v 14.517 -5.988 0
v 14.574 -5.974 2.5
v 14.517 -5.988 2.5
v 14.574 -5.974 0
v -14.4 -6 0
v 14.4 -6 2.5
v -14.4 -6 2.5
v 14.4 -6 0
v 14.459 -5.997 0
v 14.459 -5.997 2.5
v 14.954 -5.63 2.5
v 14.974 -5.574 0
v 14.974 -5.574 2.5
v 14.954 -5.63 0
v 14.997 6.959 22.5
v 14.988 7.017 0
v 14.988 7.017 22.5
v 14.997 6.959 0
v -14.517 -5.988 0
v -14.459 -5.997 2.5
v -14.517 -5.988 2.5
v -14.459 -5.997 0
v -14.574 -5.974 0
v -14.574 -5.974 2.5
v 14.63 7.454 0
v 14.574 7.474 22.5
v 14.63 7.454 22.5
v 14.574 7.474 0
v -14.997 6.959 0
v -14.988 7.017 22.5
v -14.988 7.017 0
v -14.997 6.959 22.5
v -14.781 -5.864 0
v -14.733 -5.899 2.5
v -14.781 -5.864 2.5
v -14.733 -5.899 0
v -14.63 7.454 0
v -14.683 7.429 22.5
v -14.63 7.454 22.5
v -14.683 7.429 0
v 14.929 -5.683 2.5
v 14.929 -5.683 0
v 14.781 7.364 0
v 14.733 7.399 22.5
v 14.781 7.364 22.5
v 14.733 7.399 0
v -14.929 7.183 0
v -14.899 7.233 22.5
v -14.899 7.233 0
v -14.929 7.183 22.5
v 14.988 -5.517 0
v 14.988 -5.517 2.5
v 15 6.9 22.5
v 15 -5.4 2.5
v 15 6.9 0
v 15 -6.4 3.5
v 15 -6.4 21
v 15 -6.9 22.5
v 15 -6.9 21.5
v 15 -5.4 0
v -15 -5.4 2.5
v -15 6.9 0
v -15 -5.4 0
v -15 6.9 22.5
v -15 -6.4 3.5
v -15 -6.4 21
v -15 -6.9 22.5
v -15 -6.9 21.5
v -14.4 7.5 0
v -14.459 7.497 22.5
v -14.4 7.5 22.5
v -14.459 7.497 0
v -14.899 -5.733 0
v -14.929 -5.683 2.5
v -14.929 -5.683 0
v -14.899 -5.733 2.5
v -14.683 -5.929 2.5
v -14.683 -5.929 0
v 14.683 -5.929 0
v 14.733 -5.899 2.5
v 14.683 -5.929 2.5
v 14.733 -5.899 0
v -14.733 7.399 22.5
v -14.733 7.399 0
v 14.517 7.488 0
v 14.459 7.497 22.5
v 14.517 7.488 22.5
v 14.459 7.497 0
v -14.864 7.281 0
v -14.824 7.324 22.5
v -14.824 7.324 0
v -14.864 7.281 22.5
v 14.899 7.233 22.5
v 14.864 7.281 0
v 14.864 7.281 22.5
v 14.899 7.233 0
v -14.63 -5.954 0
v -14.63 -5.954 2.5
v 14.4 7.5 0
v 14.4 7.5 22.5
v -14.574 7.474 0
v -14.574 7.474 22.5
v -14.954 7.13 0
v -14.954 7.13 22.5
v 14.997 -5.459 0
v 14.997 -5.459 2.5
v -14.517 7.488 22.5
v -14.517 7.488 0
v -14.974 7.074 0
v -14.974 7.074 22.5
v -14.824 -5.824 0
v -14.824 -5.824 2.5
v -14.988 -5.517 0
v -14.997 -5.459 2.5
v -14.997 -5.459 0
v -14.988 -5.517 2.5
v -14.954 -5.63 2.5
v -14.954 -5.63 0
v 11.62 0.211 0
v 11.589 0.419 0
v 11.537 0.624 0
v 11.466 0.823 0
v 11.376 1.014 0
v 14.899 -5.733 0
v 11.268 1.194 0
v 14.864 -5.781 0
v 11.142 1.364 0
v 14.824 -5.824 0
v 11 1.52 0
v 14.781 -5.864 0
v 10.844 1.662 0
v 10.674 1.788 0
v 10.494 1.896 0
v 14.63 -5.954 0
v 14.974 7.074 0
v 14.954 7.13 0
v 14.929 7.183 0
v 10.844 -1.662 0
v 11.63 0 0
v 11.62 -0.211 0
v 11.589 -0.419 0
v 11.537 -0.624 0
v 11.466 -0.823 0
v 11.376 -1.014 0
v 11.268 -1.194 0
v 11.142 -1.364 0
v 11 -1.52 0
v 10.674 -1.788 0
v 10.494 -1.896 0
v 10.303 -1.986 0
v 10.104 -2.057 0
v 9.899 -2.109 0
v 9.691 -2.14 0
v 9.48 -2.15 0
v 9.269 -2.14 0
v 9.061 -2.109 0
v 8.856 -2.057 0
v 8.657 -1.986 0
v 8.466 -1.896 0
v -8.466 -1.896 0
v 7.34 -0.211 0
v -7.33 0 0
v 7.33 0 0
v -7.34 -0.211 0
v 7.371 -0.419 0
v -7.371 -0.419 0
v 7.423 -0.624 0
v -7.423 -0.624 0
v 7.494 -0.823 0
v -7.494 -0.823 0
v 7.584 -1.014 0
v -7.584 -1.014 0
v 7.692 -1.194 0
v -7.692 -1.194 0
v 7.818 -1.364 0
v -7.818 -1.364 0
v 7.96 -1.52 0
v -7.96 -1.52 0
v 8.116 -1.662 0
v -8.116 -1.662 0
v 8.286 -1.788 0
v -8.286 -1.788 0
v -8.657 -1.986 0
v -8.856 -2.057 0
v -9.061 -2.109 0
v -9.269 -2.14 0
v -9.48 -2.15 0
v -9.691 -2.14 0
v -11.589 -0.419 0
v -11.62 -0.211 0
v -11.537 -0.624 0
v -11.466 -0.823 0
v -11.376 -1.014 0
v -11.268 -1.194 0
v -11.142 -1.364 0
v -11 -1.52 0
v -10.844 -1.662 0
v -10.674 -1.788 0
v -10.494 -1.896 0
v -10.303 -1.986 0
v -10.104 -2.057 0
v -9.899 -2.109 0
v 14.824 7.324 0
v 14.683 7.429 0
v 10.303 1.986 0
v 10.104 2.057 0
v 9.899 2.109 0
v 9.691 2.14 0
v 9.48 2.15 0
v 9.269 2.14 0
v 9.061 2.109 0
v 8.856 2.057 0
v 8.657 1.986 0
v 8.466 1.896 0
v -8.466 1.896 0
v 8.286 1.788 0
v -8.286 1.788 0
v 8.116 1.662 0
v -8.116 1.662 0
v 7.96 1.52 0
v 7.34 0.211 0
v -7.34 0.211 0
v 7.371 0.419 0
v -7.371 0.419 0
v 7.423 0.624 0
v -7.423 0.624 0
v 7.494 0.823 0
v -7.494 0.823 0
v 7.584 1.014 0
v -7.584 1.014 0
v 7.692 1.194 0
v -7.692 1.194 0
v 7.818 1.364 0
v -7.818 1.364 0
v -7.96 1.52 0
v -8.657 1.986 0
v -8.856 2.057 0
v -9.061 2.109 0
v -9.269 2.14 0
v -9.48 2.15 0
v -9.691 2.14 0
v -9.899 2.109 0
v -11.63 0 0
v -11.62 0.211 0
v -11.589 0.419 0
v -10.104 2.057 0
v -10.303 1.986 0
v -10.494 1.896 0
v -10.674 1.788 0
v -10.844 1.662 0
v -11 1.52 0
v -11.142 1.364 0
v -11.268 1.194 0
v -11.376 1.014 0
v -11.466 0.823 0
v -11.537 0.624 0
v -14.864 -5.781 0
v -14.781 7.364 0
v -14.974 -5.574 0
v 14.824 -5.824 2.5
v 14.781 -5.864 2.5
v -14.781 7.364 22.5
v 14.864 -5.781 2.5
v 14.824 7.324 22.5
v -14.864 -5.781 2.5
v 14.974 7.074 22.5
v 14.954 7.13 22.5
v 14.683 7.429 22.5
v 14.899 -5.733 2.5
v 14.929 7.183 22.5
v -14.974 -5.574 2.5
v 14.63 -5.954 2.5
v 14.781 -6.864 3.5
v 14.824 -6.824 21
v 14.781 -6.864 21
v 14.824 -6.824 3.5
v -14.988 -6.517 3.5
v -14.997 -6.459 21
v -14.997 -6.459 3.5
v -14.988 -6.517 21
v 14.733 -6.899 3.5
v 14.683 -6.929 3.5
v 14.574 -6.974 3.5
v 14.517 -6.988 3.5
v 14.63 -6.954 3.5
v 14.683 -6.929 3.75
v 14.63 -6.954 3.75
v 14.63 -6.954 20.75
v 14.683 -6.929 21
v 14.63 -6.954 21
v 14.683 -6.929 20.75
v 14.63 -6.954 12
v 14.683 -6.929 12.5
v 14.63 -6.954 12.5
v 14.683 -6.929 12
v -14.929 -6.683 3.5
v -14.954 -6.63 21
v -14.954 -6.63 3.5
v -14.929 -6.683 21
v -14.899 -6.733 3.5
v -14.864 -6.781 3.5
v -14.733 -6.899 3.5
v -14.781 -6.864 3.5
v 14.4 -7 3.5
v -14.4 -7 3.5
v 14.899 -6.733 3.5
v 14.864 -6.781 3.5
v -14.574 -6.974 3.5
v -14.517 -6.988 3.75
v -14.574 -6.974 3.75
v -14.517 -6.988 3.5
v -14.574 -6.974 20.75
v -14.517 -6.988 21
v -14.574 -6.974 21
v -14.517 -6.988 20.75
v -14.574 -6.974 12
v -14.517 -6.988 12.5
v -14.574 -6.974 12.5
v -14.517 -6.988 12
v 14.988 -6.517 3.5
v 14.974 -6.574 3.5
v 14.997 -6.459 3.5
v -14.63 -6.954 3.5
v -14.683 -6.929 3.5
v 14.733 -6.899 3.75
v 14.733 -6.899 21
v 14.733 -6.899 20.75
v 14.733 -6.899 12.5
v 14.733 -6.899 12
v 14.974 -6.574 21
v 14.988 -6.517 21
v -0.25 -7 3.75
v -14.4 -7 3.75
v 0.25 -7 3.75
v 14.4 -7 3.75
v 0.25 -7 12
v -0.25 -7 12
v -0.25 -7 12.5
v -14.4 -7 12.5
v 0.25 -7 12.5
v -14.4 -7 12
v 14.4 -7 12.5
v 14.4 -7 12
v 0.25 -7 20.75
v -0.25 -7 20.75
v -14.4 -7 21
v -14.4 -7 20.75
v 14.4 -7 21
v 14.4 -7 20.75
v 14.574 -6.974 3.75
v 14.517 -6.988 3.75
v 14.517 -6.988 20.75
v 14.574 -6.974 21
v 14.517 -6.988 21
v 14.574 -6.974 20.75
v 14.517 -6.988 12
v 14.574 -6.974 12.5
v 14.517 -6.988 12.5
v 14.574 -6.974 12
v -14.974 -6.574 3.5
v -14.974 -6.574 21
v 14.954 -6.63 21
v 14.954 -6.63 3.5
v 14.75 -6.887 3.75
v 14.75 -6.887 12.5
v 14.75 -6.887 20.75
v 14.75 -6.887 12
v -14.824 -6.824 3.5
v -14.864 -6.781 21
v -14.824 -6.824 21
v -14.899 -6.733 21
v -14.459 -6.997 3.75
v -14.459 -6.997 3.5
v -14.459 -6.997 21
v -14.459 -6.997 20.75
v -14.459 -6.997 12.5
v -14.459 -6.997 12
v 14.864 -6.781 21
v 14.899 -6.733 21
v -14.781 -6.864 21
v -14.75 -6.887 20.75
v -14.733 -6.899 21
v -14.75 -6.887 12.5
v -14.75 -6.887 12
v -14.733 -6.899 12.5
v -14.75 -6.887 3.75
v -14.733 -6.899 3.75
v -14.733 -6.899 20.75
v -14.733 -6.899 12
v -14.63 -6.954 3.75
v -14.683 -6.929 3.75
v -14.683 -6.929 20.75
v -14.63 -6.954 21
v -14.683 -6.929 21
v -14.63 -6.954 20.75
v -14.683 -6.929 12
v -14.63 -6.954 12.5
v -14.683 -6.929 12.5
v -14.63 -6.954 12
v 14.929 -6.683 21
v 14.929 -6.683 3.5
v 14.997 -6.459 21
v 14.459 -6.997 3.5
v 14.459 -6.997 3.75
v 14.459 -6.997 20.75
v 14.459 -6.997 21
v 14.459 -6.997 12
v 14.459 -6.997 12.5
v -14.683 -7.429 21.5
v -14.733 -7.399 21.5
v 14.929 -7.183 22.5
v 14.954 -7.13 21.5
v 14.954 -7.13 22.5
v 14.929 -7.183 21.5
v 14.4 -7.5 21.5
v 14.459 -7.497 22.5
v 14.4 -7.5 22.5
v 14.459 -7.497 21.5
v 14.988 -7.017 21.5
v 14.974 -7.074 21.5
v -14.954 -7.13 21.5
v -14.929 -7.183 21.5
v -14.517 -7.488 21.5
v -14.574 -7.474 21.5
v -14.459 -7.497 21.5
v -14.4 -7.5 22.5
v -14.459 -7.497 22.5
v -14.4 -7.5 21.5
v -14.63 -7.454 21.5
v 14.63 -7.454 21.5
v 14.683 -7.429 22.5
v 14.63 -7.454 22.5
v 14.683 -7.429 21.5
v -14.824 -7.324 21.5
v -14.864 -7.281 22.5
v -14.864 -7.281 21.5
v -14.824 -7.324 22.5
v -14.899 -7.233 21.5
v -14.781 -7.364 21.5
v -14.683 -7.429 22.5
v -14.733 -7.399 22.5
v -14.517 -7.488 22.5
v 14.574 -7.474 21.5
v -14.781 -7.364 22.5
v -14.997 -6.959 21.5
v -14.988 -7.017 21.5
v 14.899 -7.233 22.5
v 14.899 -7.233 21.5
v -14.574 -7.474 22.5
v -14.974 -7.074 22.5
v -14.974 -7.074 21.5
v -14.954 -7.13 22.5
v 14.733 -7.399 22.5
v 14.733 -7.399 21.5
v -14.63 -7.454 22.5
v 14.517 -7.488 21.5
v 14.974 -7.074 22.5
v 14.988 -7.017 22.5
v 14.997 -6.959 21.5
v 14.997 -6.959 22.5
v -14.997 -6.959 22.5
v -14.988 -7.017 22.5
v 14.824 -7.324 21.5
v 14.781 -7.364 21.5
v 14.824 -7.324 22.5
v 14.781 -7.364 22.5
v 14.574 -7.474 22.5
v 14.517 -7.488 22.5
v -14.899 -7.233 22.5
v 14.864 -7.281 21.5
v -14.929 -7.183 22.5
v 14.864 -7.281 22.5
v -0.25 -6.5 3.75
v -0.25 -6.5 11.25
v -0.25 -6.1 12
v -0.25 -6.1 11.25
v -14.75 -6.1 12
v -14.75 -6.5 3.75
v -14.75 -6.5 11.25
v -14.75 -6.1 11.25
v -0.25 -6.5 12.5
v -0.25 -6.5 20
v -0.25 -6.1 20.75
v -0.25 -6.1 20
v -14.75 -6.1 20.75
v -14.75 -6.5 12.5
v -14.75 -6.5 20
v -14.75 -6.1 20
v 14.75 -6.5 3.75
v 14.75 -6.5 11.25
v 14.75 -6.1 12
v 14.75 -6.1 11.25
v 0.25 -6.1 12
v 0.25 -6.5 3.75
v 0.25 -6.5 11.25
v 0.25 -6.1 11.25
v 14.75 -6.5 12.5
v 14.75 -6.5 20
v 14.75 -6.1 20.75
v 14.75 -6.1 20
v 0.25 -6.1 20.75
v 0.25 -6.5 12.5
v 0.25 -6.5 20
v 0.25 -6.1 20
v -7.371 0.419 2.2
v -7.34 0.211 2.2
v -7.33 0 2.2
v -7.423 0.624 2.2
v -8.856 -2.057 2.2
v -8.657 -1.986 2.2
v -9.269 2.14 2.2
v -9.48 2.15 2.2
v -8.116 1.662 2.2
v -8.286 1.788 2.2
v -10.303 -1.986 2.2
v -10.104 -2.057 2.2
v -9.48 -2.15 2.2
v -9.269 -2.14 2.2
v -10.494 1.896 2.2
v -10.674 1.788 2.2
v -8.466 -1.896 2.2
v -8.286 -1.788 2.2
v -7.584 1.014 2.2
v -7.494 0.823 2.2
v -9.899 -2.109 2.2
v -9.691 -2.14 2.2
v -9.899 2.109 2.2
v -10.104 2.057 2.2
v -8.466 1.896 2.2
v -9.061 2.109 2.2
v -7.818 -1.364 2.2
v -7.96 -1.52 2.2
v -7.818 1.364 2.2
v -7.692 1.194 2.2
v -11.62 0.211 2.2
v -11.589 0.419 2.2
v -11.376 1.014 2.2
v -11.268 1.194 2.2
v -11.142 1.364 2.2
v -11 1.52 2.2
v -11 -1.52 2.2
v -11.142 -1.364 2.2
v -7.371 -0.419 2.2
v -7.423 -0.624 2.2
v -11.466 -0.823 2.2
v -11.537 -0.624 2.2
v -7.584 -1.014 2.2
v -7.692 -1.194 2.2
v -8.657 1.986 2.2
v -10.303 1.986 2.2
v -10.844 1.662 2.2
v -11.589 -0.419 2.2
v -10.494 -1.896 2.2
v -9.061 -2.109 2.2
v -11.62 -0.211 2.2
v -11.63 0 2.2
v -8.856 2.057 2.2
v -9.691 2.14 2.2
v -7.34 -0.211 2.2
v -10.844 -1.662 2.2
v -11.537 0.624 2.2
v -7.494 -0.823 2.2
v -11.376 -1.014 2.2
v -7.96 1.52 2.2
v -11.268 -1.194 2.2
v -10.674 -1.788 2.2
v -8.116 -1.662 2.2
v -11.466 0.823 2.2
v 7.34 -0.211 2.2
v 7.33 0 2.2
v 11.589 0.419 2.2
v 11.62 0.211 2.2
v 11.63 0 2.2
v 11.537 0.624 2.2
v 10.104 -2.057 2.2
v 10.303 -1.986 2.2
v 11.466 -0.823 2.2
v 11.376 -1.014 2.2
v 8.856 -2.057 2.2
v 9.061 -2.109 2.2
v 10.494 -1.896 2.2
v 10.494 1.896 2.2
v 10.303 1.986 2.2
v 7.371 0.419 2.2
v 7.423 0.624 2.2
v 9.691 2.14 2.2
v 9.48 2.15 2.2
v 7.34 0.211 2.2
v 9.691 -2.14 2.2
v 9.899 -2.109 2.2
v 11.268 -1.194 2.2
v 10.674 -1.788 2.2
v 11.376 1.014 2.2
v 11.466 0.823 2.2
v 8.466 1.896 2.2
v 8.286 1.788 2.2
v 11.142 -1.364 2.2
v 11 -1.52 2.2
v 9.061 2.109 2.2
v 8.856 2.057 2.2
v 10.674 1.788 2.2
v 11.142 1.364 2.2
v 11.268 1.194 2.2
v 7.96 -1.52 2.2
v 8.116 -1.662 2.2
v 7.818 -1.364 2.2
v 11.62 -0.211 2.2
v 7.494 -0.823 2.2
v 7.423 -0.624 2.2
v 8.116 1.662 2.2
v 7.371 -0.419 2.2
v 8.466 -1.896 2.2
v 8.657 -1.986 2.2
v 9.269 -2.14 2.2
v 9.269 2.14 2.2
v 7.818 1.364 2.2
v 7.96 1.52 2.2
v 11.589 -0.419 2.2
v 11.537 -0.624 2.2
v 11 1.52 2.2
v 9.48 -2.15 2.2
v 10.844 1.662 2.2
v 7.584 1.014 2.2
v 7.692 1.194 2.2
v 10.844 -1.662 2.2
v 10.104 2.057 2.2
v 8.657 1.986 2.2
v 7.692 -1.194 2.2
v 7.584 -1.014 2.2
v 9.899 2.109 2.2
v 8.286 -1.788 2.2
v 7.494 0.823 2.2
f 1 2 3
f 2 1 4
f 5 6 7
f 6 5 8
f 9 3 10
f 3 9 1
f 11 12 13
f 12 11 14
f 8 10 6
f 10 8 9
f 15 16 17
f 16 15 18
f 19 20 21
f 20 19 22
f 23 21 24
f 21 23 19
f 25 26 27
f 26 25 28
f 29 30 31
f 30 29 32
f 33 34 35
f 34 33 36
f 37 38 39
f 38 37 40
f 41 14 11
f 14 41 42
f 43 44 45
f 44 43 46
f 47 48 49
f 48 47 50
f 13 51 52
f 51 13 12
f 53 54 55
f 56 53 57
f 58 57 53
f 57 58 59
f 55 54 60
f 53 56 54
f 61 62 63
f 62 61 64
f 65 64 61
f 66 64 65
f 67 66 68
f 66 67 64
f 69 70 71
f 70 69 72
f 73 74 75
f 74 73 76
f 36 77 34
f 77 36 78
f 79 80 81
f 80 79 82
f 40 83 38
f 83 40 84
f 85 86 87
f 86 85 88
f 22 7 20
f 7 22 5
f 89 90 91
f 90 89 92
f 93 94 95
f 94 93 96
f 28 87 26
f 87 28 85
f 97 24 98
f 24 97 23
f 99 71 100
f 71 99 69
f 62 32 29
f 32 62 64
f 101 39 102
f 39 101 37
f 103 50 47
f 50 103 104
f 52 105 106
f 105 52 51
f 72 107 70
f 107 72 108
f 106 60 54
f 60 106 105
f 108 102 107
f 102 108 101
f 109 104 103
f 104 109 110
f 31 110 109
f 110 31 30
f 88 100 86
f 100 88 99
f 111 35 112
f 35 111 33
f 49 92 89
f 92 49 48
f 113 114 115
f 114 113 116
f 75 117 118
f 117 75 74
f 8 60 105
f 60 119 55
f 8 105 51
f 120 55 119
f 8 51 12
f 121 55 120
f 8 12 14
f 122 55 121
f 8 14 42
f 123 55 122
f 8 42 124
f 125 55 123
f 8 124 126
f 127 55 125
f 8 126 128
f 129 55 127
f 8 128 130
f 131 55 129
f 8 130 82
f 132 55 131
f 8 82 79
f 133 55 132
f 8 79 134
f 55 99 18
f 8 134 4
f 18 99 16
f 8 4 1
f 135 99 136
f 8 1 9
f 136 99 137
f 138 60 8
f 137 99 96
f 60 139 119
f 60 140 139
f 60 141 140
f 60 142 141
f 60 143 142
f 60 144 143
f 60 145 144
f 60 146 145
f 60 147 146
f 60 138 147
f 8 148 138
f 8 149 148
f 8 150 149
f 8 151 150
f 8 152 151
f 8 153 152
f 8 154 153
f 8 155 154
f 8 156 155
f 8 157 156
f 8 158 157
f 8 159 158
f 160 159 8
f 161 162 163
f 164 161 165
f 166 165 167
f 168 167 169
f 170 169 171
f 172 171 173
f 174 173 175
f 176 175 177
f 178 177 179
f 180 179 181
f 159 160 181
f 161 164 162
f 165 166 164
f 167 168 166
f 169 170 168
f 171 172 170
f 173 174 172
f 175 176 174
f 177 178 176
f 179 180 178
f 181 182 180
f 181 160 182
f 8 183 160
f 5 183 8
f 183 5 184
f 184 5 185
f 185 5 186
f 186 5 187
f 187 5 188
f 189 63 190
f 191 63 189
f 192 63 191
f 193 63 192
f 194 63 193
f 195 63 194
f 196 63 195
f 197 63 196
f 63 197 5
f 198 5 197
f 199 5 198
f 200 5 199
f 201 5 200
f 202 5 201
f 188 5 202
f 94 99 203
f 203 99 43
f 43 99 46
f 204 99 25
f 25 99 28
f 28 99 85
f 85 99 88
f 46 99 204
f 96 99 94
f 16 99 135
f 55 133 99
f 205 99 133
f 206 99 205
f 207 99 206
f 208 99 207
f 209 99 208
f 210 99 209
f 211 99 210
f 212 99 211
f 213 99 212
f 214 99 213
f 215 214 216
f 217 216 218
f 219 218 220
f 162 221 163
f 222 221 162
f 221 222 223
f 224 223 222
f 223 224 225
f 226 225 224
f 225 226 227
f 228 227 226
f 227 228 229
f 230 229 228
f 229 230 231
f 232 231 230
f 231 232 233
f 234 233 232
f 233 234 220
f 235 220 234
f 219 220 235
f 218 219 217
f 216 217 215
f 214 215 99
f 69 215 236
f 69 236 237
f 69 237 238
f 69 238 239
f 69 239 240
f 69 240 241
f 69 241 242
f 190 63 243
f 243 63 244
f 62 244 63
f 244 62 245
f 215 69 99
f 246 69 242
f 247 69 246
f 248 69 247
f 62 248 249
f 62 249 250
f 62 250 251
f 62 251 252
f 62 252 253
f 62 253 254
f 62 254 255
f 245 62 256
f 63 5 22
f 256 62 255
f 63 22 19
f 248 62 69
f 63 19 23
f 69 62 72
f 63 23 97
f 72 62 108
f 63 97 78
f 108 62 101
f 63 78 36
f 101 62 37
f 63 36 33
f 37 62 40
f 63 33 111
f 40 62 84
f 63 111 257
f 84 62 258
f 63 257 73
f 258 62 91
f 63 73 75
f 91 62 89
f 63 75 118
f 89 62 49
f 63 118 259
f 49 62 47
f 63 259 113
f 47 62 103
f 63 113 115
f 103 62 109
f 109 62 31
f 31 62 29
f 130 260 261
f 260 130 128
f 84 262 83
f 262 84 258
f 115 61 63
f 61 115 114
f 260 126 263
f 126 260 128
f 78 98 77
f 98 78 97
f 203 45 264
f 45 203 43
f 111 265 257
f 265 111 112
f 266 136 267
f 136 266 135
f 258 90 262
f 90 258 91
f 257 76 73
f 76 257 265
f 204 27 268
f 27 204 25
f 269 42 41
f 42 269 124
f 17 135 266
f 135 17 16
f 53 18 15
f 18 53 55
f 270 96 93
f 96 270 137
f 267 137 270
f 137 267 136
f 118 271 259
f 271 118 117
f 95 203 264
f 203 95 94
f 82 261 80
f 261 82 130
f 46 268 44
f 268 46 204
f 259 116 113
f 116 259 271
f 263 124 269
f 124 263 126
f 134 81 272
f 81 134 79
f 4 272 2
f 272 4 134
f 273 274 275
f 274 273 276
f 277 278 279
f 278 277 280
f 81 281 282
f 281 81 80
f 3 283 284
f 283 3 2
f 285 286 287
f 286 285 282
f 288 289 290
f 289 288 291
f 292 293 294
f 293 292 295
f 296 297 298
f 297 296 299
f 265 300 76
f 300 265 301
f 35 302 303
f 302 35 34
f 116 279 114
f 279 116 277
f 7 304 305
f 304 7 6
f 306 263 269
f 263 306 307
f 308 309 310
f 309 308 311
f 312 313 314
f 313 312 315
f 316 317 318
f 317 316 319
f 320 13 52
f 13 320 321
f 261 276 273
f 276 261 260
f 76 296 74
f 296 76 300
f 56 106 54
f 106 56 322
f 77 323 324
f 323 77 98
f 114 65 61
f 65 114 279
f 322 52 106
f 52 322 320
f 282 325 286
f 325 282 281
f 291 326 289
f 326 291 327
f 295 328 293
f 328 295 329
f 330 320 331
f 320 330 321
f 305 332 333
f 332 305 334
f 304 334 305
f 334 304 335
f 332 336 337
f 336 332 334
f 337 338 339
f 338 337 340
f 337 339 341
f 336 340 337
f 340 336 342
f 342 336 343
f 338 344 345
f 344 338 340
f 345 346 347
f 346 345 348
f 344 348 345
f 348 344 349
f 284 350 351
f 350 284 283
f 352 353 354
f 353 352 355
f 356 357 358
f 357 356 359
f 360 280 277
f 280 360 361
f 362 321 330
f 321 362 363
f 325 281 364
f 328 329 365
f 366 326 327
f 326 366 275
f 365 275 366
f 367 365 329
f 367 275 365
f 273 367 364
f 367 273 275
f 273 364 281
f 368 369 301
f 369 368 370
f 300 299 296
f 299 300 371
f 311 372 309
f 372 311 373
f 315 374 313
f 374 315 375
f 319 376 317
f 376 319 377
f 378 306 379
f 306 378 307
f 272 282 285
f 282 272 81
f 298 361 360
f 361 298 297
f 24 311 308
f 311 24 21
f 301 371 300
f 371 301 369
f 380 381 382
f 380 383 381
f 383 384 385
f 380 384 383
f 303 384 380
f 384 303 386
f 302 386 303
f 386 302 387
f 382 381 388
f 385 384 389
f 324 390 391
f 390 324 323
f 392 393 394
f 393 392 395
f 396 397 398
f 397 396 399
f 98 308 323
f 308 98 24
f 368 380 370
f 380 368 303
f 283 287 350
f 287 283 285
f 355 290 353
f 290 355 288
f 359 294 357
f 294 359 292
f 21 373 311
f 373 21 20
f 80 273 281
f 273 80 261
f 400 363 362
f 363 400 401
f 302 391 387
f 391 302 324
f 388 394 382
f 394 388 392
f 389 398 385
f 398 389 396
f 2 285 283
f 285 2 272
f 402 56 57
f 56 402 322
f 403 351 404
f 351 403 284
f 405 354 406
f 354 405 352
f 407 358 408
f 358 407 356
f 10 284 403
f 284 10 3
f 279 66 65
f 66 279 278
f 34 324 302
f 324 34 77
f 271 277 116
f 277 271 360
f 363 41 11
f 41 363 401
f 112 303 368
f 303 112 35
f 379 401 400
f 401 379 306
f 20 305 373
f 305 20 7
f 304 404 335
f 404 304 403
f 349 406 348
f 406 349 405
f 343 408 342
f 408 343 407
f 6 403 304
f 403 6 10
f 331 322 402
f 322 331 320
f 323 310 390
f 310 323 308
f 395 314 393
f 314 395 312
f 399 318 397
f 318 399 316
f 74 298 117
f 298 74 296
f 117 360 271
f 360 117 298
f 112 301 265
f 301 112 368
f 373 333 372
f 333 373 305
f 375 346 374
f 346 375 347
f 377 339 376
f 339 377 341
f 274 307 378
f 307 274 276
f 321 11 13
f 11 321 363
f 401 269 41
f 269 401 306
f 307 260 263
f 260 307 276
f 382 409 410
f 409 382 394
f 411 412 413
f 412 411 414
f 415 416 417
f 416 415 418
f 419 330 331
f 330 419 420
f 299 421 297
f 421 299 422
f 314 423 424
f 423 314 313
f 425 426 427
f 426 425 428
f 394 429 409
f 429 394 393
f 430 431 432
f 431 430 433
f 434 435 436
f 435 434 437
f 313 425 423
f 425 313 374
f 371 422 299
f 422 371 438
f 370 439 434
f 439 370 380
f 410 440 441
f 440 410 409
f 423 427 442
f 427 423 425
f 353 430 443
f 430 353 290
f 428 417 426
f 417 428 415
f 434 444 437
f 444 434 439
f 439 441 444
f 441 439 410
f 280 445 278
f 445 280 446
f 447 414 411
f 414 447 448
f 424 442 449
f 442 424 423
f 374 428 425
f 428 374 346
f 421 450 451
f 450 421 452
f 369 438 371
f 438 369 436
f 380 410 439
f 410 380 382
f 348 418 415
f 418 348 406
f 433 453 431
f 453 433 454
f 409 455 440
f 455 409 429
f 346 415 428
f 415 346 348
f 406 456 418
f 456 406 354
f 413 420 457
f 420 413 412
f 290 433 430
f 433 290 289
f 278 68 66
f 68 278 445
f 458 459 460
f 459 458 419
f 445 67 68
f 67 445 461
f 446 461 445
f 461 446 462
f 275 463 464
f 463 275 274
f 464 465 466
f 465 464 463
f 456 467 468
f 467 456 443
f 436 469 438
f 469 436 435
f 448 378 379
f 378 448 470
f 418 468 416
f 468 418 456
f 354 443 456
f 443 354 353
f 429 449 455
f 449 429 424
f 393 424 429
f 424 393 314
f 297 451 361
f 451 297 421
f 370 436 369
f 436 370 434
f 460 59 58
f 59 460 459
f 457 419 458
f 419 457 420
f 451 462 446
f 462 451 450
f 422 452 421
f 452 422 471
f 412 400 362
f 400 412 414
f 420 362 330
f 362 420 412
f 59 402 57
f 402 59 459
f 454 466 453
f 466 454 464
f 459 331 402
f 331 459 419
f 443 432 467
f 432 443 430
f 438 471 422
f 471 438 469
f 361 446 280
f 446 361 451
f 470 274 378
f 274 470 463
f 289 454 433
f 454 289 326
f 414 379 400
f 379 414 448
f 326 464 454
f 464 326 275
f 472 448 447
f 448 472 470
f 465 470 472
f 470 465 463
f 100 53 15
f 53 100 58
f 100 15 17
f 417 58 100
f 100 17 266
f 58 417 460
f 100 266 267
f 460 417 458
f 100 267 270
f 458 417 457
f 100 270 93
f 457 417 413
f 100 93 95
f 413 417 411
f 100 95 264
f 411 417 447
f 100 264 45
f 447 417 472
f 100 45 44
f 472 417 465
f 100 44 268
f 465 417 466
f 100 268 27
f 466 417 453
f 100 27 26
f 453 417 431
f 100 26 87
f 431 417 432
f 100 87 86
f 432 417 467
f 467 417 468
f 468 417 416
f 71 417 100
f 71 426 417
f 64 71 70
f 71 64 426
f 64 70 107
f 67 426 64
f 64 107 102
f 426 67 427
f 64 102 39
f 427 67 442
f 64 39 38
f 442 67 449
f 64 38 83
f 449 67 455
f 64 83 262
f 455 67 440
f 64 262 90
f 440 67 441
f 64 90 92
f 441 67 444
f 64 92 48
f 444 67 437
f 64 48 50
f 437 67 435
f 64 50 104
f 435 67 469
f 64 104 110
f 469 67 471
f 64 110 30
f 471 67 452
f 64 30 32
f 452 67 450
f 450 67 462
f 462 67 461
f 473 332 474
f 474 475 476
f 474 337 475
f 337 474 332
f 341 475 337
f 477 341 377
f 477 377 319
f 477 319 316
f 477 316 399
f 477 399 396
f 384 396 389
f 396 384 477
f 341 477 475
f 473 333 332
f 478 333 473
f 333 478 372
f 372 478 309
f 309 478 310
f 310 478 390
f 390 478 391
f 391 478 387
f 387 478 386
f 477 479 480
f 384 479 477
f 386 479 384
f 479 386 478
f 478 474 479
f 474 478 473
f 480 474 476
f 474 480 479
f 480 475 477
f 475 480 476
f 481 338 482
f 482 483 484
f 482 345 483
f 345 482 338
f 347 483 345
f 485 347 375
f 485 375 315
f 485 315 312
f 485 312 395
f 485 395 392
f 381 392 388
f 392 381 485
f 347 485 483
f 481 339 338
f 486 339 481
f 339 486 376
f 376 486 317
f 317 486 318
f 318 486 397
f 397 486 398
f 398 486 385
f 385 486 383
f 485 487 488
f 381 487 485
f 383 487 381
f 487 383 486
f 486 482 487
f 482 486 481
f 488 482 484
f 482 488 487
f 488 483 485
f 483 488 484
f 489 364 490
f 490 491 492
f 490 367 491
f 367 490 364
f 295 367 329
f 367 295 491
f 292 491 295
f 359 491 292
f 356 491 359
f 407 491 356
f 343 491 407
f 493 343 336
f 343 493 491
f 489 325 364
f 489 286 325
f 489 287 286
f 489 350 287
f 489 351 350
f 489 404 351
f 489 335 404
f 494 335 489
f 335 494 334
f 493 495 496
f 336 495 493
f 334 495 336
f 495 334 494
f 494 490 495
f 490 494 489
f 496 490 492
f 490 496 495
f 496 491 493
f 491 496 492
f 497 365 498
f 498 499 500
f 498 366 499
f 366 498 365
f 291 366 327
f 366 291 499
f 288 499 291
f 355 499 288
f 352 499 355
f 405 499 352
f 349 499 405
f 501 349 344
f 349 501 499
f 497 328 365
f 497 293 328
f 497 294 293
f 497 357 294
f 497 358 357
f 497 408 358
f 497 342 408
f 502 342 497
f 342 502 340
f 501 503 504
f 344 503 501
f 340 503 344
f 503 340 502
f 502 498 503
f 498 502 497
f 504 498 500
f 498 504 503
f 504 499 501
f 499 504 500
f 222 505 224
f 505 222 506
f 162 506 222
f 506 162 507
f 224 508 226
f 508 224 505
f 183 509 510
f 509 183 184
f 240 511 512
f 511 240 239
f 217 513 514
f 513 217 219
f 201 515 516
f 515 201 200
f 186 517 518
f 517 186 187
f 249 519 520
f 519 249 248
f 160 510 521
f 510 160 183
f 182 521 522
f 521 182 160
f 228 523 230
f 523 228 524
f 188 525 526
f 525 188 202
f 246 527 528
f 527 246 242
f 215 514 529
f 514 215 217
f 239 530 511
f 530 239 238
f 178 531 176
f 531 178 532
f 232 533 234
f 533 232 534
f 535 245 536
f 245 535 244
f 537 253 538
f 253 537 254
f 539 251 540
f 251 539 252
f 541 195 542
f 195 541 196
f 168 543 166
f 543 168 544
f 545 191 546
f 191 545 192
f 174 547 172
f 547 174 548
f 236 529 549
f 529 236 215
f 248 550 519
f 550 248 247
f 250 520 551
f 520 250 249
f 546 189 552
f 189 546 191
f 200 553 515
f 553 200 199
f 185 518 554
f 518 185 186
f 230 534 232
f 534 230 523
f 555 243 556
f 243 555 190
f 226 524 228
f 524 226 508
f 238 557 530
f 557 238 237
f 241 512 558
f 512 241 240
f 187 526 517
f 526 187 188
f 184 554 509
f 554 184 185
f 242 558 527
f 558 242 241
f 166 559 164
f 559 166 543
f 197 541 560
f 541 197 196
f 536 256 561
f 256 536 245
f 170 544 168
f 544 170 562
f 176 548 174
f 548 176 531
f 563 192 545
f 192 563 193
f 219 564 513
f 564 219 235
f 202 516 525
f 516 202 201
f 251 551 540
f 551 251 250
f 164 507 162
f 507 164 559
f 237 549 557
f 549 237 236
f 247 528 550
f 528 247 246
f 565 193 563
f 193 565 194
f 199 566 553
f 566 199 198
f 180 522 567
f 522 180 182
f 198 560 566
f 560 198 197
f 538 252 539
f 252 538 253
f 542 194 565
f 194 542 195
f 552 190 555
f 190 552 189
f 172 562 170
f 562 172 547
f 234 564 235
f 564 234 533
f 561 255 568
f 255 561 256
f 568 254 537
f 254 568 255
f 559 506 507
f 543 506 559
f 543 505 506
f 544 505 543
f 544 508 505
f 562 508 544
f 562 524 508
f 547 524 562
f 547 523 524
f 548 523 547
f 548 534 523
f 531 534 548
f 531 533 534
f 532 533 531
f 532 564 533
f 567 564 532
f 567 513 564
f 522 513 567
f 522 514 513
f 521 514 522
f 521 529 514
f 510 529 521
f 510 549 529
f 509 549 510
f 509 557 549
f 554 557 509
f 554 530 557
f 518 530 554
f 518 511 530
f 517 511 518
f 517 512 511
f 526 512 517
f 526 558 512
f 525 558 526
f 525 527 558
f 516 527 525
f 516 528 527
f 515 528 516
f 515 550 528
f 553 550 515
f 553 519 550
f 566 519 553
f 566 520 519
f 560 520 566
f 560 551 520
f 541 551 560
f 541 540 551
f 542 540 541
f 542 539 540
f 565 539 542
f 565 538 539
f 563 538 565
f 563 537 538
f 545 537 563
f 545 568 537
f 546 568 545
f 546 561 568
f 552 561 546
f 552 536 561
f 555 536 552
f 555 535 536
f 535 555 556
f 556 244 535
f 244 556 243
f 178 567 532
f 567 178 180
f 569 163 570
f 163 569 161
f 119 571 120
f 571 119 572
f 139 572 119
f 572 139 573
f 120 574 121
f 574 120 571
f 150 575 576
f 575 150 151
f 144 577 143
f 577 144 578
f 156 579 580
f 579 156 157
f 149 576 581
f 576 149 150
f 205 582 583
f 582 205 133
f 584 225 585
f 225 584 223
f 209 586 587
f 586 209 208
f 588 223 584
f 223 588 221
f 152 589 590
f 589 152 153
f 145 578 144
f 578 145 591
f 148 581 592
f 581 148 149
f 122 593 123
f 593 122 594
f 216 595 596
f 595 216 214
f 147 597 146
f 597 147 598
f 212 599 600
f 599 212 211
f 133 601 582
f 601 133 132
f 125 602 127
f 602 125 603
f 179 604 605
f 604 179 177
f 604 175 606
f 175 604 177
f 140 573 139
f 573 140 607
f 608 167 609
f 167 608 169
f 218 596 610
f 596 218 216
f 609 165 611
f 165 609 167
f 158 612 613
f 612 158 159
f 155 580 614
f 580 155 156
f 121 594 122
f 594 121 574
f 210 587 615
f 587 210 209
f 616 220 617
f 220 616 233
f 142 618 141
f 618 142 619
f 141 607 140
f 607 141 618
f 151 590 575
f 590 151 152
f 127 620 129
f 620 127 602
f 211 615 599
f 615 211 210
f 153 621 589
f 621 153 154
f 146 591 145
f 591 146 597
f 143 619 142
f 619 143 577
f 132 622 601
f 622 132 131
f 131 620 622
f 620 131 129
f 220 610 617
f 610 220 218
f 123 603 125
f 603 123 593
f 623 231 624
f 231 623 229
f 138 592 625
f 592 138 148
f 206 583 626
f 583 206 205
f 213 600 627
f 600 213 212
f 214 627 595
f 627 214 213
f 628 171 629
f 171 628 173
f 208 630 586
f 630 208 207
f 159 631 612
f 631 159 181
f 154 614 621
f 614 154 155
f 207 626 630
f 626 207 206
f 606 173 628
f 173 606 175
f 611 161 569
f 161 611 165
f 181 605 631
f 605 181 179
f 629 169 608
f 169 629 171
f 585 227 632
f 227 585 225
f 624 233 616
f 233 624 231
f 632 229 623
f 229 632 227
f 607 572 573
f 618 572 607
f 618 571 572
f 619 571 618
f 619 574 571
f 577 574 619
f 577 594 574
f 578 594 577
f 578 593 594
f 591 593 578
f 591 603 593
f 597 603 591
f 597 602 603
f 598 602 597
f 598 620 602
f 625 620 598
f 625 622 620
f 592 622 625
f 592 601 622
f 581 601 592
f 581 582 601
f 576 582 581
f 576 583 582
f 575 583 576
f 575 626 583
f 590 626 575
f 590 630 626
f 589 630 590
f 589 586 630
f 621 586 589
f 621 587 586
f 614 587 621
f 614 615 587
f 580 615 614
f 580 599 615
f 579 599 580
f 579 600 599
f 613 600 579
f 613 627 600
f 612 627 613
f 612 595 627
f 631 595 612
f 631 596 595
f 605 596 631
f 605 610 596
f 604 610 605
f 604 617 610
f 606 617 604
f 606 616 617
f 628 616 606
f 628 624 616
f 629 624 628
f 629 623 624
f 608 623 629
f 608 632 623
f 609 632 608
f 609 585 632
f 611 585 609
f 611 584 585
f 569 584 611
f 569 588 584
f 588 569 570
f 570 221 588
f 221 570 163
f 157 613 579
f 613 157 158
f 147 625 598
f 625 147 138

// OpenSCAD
// kitchen / worktop — a base-cabinet worktop run: a worktop slab overhanging a
// carcass of drawer fronts, the carcass standing on a plinth set back at the floor.
// The body is base_unit() and the fronts unit_fronts(); see the fitted-units section
// of lib/common.scad for the section drawing and why the detail is on the front face.
//
// It used to be a plain slab with two hairlines engraved on its top, and that is the
// one thing a kitchen run cannot be: from above a worktop IS a plain slab — the doors
// are under the overhang — so a token that only carries top-face detail has nothing to
// show. What reads is the silhouette from the side: the lip line under the slab, the
// grid of fronts below it and the toe kick in shadow at the floor.
//
// Width/Depth are the real-world footprint in cm: Depth is the standard 60 cm
// base-cabinet run; Width is modular — override to the standard run lengths 60, 80,
// 100 or 120 (all stay 60 cm deep). Height is the real worktop height — the standard
// 90 cm counter — shrunk by the plan scale like the footprint (see printed_h() in
// lib/common.scad), so every counter-height piece comes out level.
//
// The run's FRONT is the -Y edge; +Y is the wall side and stays flush, so two segments
// butt against each other and against the wall.

include <../lib/common.scad>

Width  = 120;  // cm — modular run length: 60, 80, 100 or 120 (all take Depth=60)
Depth  = 60;   // cm — standard base-cabinet depth
Height = 90;   // cm — standard worktop height

// the printed height, mm: Height at the plan scale
Print_h = printed_h(Height);

// The worktop slab, in real cm — how much of the height is counter rather than
// carcass. Shared with every other unit in the run (Unit_top in lib/common.scad), so
// the lip line carries across a sink or a dishwasher without a step.
Slab = Unit_top;

// Cabinet fronts: a grid on the carcass face, Front_unit cm of run to a cabinet and
// two drawer fronts up each one — which is what a modern run mostly is, and what tells
// this piece from the sink (a door pair under the bowl) and the dishwasher (one full
// front under a fascia) at a glance.
Show_fronts = true;
Front_unit  = 60;  // cm — target width of one cabinet
Front_rows  = 2;   // drawer fronts stacked up each cabinet
// Magnet pockets in the bottom face, in a row along the width (0 = none). Two keep the
// run from pivoting. They go in the plinth, which is what the piece stands on: 54 cm of
// it front to back is 13.5 mm at 1:40, plenty of room for a 4 mm disc (see Magnet_* in
// lib/common.scad).
Magnets = 2;

worktop();

module worktop() {
    // one cabinet per Front_unit cm, spread evenly so a run that does not divide by it
    // exactly comes out as equal-width cabinets rather than one narrow leftover
    cabinets = max(1, round(Width / Front_unit));
    difference() {
        base_unit(Width, Depth, Print_h, Slab);
        if (Show_fronts)
            unit_fronts(Width, Depth,
                        unit_face_z0(Width, Depth, Print_h, Slab),
                        unit_face_z1(Width, Depth, Print_h, Slab),
                        cabinets, Front_rows, Slab);
        if (Magnets > 0)
            magnets(Width, unit_plinth_d(Width, Depth), Magnets);
    }
}
